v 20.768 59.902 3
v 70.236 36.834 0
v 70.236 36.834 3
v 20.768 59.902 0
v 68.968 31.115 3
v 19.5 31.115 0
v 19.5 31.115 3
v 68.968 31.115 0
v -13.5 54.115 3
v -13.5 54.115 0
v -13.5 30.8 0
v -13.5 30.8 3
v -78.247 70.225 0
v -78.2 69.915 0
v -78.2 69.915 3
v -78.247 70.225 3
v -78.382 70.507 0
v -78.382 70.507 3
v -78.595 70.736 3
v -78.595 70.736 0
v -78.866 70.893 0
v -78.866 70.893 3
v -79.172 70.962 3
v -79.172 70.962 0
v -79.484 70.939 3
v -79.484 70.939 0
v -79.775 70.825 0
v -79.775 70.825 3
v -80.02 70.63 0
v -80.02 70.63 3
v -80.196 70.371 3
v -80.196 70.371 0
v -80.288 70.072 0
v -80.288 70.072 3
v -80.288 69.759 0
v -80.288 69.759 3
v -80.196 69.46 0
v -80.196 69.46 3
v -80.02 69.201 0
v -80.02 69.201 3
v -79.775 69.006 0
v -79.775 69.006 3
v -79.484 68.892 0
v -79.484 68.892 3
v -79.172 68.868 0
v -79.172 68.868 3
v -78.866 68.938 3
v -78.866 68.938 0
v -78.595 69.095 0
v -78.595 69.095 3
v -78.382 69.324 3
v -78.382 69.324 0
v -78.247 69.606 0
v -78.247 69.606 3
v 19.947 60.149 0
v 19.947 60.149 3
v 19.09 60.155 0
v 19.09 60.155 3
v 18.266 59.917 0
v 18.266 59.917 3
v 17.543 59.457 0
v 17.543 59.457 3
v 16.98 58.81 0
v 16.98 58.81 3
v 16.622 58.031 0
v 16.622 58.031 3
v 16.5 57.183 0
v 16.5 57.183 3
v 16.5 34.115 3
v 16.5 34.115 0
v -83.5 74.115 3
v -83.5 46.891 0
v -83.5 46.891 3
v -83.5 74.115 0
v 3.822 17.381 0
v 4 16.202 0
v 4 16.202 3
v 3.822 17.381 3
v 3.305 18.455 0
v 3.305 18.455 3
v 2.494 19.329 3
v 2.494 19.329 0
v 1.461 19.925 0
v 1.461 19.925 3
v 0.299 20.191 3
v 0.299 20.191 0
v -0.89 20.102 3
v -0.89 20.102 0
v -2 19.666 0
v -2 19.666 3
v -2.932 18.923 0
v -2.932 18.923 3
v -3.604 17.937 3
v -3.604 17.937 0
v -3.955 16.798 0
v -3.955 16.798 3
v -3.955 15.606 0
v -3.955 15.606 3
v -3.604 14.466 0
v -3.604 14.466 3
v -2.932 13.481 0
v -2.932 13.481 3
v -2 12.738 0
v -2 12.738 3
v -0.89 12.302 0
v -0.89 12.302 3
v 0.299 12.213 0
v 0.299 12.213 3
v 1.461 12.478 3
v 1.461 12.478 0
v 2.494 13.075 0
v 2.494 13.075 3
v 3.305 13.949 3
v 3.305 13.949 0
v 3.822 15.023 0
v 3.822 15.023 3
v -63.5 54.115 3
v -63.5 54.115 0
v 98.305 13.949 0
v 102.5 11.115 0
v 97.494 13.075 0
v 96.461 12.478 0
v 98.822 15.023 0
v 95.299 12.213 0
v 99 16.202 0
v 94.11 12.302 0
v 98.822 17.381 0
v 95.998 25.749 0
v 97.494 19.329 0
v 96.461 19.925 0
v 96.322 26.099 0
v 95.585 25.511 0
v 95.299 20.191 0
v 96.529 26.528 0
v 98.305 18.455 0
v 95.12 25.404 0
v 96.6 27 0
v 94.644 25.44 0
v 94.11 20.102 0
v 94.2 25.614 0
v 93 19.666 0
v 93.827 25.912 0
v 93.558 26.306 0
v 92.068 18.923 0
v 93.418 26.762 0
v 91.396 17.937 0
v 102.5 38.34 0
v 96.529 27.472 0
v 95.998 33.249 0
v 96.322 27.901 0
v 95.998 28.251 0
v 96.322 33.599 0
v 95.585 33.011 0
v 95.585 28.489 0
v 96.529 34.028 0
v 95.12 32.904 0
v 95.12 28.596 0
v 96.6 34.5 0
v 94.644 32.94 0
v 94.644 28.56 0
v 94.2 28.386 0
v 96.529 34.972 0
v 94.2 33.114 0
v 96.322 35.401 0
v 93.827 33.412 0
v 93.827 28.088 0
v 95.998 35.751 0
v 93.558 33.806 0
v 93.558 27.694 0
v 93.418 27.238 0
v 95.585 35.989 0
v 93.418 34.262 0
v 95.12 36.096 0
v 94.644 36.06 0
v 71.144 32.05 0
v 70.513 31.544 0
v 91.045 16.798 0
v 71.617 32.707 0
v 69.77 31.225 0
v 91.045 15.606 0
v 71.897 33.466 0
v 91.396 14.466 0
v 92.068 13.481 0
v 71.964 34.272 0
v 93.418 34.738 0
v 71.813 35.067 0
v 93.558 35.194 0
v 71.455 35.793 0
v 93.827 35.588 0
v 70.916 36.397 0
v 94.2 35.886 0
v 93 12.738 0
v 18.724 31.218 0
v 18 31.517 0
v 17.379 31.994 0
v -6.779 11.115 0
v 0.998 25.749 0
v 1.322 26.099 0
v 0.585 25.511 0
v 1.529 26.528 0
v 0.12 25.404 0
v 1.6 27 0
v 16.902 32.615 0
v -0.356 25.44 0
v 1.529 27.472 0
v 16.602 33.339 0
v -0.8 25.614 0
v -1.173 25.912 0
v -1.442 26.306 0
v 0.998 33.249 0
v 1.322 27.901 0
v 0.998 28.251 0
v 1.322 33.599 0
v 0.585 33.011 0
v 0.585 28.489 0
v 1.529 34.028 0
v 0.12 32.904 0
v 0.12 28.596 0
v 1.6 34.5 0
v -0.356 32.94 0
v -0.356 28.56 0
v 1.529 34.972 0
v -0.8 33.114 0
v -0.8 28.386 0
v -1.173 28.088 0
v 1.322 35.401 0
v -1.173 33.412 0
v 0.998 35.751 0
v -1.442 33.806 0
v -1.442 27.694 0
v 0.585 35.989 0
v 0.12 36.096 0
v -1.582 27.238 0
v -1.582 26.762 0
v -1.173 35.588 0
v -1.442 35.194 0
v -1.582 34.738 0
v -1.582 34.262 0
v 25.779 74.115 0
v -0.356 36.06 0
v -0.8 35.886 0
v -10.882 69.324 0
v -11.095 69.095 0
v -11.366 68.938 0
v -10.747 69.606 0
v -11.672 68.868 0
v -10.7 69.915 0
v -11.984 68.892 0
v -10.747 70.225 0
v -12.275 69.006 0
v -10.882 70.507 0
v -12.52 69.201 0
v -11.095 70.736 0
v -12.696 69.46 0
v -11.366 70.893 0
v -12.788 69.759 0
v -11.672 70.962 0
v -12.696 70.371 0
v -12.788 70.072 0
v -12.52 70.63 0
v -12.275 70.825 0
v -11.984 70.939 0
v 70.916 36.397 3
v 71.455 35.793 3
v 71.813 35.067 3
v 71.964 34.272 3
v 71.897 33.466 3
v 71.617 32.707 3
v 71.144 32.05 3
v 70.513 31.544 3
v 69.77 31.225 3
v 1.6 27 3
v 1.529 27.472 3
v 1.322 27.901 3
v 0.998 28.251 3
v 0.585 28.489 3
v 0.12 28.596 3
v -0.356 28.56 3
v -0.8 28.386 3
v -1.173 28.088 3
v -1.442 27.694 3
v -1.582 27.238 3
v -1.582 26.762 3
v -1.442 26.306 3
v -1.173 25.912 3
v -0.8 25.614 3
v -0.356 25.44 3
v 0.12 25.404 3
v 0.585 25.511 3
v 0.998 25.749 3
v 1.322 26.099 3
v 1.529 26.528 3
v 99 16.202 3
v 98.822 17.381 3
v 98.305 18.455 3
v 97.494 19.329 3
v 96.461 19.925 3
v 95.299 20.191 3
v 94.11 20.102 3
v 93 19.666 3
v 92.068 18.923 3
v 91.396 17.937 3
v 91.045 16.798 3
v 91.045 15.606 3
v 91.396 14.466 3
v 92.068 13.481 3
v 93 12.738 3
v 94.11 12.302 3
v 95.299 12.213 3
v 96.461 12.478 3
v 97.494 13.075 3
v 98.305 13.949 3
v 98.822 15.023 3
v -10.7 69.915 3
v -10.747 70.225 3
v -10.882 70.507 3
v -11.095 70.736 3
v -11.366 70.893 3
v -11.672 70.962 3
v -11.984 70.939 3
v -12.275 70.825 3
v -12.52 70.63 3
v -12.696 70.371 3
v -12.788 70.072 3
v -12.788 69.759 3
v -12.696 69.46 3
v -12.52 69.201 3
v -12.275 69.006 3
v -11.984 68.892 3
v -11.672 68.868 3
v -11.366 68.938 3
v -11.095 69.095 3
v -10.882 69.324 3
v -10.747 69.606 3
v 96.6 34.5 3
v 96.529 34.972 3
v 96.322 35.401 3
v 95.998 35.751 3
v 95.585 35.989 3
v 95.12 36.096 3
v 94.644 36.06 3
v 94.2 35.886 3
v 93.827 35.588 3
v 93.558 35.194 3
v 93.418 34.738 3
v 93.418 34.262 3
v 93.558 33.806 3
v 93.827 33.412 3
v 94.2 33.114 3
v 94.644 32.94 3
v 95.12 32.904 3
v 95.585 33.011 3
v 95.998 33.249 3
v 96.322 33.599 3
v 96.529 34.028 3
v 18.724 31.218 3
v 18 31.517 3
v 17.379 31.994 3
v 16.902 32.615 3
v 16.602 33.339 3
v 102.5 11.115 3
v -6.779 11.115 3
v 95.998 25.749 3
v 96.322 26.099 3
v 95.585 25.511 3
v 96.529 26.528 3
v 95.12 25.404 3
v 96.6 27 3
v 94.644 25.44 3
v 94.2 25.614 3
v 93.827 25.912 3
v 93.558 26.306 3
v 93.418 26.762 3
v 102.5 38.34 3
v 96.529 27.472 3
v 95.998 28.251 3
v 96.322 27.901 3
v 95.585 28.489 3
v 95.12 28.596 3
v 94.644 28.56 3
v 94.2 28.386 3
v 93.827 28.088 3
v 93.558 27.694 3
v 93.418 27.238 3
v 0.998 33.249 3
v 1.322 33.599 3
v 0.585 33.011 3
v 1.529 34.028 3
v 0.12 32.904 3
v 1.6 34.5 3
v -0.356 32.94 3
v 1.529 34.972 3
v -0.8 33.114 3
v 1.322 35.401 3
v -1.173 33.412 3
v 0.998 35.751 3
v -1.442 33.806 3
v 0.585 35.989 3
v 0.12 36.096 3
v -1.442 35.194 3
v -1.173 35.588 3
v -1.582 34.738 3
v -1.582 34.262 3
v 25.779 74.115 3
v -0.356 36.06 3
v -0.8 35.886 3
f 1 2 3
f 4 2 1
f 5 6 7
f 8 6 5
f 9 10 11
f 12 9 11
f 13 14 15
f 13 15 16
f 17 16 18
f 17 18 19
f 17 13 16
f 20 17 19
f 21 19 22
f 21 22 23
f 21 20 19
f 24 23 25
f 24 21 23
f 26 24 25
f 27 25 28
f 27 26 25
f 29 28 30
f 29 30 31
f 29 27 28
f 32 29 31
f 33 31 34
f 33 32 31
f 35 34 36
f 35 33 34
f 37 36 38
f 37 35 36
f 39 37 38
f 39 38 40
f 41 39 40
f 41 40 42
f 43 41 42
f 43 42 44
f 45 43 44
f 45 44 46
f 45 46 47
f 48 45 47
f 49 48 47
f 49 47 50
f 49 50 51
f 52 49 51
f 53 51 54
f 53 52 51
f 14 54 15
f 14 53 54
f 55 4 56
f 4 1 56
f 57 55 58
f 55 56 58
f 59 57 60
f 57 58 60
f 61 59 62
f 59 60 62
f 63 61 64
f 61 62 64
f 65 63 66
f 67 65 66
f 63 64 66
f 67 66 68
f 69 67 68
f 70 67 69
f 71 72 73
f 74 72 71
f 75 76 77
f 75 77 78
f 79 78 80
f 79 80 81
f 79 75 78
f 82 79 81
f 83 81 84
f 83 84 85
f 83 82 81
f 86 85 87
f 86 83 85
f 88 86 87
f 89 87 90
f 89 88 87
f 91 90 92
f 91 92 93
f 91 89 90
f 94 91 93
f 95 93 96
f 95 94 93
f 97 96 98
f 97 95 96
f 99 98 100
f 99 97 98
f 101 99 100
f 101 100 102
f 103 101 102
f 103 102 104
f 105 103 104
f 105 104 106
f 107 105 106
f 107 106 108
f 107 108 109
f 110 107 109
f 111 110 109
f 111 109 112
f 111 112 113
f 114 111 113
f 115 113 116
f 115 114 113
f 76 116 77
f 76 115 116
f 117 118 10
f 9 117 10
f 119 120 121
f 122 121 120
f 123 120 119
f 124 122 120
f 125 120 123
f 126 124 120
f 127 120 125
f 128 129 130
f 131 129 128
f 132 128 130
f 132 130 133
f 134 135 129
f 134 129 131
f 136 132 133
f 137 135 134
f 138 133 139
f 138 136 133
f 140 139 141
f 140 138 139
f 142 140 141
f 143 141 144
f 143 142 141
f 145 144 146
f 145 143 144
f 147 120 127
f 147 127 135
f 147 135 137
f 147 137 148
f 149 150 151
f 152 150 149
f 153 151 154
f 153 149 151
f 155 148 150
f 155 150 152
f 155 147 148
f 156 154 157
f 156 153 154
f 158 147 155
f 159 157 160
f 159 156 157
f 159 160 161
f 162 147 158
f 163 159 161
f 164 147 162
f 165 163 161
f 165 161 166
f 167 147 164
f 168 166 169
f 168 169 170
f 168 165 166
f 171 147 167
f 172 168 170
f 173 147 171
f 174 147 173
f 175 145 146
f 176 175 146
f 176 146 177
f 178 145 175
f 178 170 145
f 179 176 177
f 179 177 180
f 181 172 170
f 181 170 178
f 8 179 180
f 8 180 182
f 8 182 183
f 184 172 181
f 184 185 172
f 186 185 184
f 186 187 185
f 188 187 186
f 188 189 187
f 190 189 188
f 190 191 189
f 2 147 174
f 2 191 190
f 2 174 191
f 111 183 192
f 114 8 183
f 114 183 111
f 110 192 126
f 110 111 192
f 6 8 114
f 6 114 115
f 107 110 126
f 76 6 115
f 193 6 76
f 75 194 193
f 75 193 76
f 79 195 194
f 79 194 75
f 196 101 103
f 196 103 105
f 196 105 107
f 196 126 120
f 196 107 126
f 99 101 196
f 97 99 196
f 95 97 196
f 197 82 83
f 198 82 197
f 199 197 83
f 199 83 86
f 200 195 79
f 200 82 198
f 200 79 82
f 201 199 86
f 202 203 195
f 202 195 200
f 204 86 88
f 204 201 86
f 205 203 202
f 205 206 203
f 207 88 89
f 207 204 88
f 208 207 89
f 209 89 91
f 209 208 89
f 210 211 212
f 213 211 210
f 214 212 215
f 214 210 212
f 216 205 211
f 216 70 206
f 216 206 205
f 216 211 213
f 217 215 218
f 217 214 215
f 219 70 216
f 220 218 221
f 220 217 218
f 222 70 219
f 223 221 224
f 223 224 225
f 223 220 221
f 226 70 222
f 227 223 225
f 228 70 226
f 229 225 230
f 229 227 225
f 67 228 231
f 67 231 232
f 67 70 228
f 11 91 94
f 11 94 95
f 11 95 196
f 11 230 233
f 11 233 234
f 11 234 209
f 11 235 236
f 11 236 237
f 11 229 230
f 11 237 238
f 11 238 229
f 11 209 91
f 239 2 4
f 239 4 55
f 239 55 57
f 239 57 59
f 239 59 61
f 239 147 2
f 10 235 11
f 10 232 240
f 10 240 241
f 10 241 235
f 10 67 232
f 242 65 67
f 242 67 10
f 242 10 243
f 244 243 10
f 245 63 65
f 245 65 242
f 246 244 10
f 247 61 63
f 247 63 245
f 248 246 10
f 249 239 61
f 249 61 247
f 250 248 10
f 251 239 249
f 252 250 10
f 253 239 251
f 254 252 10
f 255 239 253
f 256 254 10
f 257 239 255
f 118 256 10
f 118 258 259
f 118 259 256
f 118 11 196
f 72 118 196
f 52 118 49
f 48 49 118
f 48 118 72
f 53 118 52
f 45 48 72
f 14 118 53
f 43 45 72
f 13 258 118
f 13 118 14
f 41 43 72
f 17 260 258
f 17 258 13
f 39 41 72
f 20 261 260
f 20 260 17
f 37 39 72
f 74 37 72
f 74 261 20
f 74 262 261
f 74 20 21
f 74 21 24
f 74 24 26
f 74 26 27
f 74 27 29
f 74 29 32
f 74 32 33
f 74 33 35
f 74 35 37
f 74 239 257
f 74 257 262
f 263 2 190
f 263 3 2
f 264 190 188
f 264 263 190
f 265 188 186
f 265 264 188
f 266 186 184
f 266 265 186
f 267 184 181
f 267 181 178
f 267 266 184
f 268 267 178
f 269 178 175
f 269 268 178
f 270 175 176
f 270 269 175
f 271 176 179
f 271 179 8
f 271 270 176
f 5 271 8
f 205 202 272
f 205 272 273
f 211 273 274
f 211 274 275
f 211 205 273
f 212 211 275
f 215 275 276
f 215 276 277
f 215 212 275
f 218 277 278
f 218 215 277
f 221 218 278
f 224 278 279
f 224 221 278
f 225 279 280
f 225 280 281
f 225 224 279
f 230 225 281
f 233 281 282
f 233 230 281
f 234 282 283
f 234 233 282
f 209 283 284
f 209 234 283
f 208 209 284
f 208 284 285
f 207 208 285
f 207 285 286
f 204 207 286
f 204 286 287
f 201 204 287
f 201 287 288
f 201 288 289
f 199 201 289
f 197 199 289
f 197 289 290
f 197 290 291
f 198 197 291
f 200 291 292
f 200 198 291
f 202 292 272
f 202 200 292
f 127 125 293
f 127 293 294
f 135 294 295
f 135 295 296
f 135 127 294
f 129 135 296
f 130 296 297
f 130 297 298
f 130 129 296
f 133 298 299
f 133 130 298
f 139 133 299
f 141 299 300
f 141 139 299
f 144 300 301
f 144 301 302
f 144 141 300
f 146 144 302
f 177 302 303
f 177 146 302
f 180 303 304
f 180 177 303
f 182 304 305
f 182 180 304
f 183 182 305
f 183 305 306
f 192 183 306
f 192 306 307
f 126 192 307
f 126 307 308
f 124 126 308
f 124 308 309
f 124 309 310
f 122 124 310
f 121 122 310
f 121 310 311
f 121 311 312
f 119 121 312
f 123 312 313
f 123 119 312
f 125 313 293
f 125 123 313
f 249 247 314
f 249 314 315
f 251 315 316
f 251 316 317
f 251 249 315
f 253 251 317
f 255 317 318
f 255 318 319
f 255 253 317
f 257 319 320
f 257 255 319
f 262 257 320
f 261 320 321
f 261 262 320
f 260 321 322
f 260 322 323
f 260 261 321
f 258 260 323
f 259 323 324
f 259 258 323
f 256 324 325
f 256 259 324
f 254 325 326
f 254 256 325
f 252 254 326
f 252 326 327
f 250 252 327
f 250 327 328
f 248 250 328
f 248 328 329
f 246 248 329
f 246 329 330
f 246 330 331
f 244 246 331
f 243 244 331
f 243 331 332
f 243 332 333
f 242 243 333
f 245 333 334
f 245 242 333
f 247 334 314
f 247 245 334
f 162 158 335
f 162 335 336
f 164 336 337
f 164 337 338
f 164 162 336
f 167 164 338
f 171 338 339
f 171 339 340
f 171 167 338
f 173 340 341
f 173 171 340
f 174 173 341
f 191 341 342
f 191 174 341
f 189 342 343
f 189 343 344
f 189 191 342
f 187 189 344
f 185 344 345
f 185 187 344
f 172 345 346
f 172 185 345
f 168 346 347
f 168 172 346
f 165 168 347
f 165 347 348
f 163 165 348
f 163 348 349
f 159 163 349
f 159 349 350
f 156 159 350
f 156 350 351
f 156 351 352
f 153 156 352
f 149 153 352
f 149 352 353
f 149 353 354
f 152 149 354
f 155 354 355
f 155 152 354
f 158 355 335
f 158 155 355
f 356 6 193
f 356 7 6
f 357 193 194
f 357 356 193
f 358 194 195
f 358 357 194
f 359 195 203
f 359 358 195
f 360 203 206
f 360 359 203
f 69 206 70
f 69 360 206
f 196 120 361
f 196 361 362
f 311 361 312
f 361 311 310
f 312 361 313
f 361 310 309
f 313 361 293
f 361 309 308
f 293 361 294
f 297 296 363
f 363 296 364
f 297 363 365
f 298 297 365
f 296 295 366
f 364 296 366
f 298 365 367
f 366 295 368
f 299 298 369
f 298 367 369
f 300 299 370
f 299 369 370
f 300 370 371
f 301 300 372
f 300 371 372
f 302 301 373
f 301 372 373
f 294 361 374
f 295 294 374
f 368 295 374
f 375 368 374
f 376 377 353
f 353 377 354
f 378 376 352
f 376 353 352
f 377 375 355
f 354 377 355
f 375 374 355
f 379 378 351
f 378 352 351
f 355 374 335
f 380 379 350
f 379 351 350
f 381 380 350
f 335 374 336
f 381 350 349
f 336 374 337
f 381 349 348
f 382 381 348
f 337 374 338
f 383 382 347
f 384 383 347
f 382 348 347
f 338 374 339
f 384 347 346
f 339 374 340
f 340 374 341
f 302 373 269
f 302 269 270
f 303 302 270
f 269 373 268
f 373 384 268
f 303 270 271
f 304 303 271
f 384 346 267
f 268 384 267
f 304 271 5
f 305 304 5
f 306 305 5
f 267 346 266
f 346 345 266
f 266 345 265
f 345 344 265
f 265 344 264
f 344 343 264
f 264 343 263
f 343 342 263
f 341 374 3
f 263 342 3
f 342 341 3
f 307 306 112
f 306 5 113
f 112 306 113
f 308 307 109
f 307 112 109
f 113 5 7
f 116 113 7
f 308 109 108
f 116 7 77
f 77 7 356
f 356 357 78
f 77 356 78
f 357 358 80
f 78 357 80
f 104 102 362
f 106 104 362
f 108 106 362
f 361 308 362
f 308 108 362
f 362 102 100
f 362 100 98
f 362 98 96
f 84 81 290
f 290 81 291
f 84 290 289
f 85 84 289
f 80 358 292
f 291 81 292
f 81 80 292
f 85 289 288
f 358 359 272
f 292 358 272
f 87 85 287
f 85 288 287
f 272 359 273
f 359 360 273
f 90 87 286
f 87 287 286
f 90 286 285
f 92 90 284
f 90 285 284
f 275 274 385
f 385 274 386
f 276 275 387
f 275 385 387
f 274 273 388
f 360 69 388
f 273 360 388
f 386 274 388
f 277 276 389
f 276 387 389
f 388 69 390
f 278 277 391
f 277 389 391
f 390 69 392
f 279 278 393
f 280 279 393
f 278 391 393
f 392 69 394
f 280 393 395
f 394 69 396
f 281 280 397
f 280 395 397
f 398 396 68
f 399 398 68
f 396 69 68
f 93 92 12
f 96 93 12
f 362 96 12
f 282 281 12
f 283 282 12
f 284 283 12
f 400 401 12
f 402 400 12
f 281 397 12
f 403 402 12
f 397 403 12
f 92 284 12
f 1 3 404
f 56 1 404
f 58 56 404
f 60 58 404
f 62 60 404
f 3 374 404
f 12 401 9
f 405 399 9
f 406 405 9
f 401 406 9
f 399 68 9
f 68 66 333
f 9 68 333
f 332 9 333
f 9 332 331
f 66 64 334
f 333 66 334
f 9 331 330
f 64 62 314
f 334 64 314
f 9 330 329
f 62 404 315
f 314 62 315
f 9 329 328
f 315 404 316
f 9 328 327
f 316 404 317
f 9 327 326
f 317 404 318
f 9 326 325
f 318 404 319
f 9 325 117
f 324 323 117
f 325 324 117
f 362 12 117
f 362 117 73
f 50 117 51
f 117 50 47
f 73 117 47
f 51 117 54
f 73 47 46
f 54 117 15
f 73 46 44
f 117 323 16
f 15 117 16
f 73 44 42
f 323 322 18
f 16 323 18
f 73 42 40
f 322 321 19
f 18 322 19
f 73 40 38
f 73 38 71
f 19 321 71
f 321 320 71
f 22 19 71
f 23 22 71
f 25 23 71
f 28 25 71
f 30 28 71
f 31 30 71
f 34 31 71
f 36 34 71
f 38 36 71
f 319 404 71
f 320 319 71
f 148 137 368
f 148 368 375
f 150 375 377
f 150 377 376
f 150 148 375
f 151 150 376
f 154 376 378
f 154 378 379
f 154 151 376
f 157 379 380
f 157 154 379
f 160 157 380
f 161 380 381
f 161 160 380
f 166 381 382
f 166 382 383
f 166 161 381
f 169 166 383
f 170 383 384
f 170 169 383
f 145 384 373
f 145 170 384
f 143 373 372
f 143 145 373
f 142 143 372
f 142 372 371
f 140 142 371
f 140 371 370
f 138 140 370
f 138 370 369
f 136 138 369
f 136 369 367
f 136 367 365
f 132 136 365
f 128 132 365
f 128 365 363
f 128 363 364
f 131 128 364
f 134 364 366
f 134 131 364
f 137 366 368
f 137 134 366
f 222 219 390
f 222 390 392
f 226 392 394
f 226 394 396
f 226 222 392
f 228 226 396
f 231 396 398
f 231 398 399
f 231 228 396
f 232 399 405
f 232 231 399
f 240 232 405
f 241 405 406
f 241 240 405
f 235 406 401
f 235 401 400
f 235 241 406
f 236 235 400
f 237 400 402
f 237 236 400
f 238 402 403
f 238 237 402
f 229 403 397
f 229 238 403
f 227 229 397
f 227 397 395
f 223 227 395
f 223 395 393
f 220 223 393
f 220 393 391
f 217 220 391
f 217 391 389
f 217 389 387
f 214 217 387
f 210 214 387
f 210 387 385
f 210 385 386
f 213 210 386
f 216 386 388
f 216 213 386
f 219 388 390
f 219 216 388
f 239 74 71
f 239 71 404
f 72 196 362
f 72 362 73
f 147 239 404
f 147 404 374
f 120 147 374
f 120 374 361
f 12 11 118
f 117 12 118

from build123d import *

# Parameters (mm, degrees)
SKETCH1_R      = 1.05
SKETCH1_R_2    = 4
SKETCH1_R_3    = 1.6
EXTRUDE1_DEPTH = 3
FILLET1_R      = 3


with BuildPart() as part:
    # Sketch1 → Extrude1 (new body)
    with BuildSketch(Plane.XY):
        Polygon((-83.5, 74.115427319), (25.779226165, 74.115427319), (102.5, 38.33994294), (102.5, 11.115427319), (-6.779226165, 11.115427319), (-83.5, 46.890911697), align=None)
        with Locations((-79.25, 69.915427319)):
            Circle(SKETCH1_R, mode=Mode.SUBTRACT)
        with Locations((-11.75, 69.915427319)):
            Circle(SKETCH1_R, mode=Mode.SUBTRACT)
        with Locations((0, 16.201854058)):
            Circle(SKETCH1_R_2, mode=Mode.SUBTRACT)
        with Locations((95, 16.201854058)):
            Circle(SKETCH1_R_2, mode=Mode.SUBTRACT)
        with Locations((95, 27)):
            Circle(SKETCH1_R_3, mode=Mode.SUBTRACT)
        with Locations((95, 34.5)):
            Circle(SKETCH1_R_3, mode=Mode.SUBTRACT)
        with Locations((0, 34.5)):
            Circle(SKETCH1_R_3, mode=Mode.SUBTRACT)
        with Locations((0, 27)):
            Circle(SKETCH1_R_3, mode=Mode.SUBTRACT)
        Polygon((-63.5, 54.115427319), (-13.5, 54.115427319), (-13.5, 30.800044411), align=None, mode=Mode.SUBTRACT)
        Polygon((16.5, 61.891732757), (16.5, 31.115427319), (82.5, 31.115427319), align=None, mode=Mode.SUBTRACT)
    extrude(amount=EXTRUDE1_DEPTH)

    # Fillet1
    fillet1_edges = [part.edges().sort_by_distance(p)[0] for p in [
        (82.5, 31.115427319, 1.5),
        (16.5, 61.891732757, 1.5),
        (16.5, 31.115427319, 1.5),
    ]]
    fillet(fillet1_edges, radius=FILLET1_R)


solid = part.part
